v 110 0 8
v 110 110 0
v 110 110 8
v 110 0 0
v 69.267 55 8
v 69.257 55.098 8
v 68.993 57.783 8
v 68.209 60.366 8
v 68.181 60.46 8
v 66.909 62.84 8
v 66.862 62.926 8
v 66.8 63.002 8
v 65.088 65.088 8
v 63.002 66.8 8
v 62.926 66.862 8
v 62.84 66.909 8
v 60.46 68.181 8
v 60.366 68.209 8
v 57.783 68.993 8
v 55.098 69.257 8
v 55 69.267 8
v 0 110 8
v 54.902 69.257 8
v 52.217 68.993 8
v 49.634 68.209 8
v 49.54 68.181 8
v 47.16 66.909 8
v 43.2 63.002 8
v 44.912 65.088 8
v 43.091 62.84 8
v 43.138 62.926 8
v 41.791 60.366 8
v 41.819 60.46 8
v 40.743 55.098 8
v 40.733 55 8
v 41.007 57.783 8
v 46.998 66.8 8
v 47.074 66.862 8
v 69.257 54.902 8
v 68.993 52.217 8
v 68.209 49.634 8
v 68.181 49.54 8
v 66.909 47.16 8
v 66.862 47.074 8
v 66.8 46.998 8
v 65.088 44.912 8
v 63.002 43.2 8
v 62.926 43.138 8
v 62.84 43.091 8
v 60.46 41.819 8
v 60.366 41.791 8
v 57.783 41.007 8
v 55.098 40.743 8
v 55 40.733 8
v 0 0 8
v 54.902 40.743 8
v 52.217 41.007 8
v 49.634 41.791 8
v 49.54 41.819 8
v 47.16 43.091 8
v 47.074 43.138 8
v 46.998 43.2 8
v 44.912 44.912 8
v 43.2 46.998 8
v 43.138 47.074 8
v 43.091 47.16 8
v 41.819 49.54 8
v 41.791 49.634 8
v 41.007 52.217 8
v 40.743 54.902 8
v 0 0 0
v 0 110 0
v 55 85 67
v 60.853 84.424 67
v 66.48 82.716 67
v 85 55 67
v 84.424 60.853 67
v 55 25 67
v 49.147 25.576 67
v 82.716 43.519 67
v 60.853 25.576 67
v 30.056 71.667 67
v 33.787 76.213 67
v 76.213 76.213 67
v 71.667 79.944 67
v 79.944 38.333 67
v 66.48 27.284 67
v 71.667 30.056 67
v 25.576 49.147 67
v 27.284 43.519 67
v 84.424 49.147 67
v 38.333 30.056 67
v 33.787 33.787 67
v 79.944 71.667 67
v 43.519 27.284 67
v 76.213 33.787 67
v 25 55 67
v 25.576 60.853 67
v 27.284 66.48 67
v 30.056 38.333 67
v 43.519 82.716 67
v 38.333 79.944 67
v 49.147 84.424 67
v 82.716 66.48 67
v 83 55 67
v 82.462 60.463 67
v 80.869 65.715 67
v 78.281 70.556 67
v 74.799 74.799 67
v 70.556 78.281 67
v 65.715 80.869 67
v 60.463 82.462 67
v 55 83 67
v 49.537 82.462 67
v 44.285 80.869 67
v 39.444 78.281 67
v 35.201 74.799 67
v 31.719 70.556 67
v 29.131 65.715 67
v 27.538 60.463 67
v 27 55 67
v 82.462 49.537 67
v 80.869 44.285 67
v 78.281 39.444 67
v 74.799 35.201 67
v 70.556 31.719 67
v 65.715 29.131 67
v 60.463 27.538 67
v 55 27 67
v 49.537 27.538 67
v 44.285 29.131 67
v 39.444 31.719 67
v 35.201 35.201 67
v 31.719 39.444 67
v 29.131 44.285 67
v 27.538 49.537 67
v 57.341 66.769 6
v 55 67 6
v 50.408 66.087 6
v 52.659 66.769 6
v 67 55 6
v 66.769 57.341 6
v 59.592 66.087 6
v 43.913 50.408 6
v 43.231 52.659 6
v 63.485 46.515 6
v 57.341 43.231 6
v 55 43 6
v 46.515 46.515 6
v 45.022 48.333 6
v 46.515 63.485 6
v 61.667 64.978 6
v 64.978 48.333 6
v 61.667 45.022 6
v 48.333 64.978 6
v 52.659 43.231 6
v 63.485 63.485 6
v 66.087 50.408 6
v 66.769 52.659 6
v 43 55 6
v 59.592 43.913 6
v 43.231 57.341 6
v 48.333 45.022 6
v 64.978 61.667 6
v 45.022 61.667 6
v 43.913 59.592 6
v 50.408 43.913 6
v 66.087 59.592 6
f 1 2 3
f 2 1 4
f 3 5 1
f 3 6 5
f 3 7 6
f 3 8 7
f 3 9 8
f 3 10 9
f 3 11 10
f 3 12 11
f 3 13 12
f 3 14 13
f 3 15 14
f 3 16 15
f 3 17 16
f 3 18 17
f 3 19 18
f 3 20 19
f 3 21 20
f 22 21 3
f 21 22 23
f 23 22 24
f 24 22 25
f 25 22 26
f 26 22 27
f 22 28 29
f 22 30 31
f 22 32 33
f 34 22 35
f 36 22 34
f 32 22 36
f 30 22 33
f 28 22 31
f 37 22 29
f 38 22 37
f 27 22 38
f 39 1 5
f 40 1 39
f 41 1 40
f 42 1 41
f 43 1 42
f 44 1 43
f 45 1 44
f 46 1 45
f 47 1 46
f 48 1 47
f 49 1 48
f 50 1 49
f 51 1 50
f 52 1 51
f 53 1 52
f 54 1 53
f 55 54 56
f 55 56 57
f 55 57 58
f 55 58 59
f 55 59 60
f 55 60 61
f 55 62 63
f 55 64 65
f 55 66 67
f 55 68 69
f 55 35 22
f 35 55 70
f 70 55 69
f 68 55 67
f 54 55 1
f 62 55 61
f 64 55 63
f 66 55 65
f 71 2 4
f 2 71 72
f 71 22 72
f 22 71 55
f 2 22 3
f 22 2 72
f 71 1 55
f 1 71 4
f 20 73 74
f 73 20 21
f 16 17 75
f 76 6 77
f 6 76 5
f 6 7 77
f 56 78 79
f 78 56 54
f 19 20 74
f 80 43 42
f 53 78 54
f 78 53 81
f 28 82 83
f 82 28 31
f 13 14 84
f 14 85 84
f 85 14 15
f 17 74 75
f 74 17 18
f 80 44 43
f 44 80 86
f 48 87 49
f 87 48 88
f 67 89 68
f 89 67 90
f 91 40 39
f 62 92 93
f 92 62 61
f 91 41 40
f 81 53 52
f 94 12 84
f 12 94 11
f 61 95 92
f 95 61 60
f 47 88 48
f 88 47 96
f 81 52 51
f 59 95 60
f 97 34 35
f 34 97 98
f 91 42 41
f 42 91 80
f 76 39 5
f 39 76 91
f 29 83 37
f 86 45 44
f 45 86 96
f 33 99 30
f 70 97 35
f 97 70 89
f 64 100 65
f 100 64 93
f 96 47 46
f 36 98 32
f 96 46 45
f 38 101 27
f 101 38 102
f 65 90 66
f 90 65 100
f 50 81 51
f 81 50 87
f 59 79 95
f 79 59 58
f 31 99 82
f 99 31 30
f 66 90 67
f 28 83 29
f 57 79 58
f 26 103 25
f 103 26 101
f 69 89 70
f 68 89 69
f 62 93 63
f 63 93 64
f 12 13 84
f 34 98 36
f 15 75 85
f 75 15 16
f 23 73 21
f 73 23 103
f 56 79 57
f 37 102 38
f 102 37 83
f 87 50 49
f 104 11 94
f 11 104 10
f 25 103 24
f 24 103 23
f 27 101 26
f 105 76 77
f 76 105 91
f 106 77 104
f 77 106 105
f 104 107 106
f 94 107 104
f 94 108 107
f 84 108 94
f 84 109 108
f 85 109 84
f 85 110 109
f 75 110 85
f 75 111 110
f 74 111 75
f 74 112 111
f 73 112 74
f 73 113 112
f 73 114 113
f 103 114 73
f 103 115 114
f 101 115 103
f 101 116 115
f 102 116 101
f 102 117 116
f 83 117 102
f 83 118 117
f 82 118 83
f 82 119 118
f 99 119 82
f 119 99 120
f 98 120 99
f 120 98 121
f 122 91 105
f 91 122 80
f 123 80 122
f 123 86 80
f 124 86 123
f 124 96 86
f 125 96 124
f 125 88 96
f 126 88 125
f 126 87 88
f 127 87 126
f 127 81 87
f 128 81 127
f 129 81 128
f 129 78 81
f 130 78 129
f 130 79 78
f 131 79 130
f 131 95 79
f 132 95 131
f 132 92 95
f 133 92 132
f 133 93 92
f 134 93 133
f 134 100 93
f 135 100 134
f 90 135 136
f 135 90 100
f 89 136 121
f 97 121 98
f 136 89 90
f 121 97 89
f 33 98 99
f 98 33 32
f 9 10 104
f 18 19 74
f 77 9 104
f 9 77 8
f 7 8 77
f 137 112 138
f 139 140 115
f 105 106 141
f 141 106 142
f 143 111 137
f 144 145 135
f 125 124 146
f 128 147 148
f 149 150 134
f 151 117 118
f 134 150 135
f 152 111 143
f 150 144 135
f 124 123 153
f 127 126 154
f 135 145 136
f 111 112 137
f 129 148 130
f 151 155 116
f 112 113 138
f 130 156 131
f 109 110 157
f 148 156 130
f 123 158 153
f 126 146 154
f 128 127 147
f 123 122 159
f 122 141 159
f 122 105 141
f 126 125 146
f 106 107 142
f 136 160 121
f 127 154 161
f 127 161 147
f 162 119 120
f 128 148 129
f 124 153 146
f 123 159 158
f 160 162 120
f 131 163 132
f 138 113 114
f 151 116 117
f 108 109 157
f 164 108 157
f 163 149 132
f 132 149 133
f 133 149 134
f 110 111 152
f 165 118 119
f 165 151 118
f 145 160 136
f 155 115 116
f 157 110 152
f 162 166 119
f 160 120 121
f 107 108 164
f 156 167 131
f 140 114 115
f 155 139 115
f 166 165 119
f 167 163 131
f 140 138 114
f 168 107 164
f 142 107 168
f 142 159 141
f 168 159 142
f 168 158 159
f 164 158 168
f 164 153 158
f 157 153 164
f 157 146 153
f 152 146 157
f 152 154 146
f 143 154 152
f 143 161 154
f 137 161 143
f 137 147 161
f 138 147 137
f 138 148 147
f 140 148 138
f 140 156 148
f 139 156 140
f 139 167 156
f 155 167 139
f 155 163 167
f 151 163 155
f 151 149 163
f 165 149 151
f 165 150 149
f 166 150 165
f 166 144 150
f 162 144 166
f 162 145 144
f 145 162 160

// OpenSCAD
$fn = 32;

// ----------------------------------------------------------------------
// Hopper: funnel with square flange
// ----------------------------------------------------------------------

// --- parameters (mm) ---
fl = 110;                 // flange side, X and Y
fl_t = 8;                 // flange thickness
cone_h = 60;              // cone height above the flange
top_d = 60;               // cone mouth diameter
bot_d = 28;               // cone spout diameter
wall = 2;                 // cone wall thickness

bore_d = bot_d - 2 * wall;  // spout bore diameter
total_h = fl_t + cone_h - 1;  // overall height

difference() {
  union() {
    cube([fl, fl, fl_t]);
    translate([fl / 2, fl / 2, fl_t - 1])
      cylinder(h = cone_h, d1 = bot_d, d2 = top_d);
  }
  translate([fl / 2, fl / 2, fl_t - 2])
    cylinder(h = cone_h + 1, d1 = bore_d, d2 = top_d - 2 * wall);
}
